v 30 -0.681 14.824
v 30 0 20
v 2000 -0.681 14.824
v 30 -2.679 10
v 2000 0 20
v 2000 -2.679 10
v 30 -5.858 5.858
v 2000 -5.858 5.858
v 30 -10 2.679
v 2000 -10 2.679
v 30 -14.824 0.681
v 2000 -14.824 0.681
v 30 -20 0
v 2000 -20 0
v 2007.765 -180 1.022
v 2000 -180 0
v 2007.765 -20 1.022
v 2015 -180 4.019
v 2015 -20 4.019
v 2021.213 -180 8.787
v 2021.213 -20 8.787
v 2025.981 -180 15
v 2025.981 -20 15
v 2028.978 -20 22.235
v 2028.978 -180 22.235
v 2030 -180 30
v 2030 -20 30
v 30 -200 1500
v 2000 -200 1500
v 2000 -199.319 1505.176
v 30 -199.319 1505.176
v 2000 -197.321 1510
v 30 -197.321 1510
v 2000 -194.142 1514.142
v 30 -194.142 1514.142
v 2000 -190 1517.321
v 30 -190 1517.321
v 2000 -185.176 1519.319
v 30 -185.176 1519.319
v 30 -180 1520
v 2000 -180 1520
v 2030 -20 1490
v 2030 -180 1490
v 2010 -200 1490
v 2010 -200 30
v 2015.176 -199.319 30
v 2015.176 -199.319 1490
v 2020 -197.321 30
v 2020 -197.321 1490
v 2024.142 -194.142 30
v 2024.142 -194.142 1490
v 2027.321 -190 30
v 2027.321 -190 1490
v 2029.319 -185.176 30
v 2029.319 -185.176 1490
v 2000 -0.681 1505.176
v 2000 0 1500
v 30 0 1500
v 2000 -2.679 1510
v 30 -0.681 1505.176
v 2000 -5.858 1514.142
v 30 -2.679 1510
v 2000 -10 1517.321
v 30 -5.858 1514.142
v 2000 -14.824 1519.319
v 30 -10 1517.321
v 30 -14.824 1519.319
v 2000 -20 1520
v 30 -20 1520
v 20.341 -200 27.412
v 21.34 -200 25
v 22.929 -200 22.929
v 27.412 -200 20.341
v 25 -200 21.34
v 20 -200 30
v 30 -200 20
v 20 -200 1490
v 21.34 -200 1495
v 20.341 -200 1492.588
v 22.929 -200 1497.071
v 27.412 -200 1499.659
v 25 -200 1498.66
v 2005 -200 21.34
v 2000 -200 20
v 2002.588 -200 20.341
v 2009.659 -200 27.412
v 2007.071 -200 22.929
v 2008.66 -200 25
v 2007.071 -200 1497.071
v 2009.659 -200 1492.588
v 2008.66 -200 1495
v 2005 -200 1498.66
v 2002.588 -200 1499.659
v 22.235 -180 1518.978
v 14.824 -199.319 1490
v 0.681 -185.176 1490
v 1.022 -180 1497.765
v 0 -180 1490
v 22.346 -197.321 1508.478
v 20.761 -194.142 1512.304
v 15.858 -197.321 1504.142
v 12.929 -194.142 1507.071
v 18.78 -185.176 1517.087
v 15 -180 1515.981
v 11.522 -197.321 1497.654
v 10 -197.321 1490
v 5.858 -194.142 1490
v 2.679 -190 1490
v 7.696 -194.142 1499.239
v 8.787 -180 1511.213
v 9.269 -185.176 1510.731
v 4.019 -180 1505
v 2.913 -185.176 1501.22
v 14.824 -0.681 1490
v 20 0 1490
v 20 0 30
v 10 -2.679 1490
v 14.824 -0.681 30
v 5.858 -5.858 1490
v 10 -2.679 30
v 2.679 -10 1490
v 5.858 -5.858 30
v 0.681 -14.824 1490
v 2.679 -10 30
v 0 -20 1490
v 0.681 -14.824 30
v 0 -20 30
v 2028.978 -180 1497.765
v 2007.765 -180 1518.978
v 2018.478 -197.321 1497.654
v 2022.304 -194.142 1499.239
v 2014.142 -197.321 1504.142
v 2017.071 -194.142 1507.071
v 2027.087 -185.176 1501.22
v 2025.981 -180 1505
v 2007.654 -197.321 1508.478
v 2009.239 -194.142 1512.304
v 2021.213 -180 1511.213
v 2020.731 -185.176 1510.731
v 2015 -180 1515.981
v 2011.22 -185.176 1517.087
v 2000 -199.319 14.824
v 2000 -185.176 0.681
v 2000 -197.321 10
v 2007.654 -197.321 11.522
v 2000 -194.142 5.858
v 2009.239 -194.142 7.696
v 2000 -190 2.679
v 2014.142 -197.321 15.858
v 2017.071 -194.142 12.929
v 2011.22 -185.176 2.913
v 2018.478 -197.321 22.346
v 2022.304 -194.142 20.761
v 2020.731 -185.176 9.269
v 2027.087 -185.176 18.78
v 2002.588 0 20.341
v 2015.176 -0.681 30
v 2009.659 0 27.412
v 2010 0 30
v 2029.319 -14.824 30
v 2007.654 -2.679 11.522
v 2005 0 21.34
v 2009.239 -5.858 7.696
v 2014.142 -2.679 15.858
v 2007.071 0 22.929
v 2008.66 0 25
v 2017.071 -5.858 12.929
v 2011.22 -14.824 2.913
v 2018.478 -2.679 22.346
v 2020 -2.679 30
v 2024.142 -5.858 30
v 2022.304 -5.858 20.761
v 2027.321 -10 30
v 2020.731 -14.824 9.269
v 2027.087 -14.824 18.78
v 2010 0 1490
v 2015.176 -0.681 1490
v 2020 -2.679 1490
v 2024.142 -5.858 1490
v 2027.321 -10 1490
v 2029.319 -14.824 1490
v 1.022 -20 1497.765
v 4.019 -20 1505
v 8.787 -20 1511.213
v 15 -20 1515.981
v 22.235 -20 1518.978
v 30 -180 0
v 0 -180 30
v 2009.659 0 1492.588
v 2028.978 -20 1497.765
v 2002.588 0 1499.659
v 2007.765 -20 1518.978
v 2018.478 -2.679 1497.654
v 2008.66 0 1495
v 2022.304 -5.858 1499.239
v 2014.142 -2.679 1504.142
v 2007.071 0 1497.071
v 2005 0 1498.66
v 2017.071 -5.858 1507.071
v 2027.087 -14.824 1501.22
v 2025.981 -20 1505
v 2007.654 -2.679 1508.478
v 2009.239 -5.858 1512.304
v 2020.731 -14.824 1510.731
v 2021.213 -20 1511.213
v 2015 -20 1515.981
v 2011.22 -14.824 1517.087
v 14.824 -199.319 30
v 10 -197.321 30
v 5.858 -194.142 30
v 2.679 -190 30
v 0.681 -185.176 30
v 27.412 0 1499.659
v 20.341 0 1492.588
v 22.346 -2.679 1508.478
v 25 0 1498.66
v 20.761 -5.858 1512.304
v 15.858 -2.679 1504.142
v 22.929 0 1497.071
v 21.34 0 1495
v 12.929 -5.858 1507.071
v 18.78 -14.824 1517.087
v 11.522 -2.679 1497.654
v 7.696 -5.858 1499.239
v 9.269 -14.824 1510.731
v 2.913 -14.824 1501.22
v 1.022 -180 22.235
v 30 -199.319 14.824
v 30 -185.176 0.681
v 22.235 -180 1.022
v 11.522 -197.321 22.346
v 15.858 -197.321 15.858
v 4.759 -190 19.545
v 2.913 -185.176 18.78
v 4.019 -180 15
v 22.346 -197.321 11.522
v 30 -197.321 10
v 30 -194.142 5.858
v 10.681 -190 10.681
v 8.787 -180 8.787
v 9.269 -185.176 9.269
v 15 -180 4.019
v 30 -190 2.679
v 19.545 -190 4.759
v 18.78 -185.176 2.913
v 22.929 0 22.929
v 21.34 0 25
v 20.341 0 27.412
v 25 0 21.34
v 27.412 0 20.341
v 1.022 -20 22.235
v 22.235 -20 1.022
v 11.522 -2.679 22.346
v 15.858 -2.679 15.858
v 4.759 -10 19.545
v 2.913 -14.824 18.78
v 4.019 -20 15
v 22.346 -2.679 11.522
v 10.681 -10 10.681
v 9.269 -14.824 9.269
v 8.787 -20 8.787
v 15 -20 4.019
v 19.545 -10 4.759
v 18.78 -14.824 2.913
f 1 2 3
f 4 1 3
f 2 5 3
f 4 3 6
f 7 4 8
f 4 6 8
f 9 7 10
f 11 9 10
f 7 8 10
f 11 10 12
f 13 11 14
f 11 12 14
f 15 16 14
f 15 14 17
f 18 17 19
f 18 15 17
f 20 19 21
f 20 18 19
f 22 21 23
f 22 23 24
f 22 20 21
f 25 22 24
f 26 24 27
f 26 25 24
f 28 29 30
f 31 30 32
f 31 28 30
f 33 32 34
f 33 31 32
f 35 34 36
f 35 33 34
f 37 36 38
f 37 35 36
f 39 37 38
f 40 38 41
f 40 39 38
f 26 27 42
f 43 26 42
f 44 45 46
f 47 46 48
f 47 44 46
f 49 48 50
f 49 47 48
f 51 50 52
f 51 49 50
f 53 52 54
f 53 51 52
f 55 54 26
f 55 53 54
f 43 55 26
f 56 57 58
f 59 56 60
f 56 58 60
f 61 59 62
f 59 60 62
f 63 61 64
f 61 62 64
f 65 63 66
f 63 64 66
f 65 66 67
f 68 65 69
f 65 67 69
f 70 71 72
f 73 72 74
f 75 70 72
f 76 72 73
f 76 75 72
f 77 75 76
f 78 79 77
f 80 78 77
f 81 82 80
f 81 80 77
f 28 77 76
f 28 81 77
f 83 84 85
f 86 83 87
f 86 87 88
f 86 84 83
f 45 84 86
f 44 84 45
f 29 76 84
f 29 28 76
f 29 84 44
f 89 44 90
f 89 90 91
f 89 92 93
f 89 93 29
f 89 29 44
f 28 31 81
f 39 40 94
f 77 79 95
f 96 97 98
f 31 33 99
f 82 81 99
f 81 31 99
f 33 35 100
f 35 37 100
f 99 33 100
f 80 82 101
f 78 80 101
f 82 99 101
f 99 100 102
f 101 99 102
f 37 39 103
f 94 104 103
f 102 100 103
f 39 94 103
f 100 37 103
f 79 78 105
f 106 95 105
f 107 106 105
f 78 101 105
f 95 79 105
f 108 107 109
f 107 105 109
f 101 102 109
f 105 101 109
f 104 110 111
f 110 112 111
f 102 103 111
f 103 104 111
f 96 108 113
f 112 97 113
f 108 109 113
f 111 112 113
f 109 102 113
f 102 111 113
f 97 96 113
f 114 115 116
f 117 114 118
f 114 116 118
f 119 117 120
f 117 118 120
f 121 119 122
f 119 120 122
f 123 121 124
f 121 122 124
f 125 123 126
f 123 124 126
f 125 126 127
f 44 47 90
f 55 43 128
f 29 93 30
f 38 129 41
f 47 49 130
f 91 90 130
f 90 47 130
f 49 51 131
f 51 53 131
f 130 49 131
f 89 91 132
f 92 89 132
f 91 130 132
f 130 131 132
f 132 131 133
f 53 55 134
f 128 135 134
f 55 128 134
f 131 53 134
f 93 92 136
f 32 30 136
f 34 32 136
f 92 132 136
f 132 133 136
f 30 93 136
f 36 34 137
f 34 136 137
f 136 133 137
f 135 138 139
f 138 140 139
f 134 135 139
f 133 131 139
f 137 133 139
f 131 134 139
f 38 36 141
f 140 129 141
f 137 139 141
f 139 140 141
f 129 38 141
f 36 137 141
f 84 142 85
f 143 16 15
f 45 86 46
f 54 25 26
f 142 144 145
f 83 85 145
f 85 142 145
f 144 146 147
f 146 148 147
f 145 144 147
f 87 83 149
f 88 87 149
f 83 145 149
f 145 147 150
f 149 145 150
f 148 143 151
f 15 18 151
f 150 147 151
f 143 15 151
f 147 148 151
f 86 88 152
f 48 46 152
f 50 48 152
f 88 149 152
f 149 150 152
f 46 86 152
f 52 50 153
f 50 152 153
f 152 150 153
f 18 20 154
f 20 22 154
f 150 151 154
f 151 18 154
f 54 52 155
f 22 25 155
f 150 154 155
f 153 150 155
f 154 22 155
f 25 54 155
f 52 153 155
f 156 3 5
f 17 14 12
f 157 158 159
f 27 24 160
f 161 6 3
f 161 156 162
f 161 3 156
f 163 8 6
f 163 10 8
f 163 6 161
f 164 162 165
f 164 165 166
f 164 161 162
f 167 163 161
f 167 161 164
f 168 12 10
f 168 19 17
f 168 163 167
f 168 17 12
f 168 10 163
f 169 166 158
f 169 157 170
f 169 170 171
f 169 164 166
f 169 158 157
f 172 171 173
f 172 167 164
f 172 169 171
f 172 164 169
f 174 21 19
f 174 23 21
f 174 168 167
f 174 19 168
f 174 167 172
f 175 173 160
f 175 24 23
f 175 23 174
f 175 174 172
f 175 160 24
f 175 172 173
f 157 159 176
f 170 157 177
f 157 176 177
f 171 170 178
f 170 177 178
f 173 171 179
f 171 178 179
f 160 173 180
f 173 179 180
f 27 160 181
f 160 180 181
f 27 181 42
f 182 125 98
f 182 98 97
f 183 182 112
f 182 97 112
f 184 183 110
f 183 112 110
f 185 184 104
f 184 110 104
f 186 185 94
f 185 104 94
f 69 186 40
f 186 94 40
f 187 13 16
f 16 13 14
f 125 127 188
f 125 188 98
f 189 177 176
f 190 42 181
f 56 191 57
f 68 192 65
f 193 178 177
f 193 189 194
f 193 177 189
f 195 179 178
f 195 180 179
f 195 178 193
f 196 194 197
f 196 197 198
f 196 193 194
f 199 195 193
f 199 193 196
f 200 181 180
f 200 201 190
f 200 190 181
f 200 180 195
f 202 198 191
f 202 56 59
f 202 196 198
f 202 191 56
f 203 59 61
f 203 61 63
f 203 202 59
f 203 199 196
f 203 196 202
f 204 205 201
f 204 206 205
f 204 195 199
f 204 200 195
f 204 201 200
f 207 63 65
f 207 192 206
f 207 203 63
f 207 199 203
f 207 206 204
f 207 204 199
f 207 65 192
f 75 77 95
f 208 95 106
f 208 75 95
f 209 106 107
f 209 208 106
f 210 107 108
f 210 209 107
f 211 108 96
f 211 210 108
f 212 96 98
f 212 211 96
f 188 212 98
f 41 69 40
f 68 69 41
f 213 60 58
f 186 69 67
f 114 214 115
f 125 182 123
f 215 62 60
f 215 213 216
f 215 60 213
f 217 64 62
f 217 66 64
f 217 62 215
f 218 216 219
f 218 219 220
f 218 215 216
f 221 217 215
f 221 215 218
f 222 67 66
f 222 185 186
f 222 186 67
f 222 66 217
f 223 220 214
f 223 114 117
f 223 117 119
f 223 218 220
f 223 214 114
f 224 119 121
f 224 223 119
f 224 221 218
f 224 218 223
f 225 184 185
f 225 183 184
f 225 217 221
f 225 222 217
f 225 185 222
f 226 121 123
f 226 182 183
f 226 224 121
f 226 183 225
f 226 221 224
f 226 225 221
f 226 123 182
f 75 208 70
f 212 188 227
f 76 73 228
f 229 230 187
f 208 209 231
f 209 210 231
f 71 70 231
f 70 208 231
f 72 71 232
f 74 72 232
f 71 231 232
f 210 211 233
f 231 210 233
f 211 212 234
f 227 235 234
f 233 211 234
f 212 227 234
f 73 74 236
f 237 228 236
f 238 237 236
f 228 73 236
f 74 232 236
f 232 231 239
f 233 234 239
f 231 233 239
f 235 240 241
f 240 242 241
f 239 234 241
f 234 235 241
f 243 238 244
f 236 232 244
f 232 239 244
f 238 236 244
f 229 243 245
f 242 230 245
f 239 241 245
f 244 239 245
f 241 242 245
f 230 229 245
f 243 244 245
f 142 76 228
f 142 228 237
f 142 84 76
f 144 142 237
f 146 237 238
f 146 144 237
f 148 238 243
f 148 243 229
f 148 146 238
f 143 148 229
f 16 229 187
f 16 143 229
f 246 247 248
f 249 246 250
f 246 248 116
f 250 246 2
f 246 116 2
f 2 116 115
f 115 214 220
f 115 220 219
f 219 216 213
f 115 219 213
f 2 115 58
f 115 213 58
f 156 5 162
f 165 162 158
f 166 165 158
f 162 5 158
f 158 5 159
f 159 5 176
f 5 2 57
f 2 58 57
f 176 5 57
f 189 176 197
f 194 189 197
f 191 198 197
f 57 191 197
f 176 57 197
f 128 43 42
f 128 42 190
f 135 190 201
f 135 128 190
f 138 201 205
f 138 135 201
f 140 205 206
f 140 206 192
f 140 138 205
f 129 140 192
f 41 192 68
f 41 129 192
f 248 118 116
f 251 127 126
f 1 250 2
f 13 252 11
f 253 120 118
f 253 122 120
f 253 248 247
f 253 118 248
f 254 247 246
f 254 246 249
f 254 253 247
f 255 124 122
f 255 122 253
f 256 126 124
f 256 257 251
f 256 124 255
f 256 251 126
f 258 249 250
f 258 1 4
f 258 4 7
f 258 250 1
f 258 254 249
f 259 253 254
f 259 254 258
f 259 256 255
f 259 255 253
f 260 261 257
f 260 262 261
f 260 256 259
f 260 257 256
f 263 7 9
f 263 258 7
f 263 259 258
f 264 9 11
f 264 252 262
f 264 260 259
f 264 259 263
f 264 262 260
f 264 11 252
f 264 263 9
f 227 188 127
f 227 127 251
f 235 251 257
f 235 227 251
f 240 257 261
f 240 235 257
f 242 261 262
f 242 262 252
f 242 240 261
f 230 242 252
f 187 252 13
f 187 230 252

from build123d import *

# Parameters (mm, degrees)
F0_W     = 2030
F0_H     = 1520
F1_DEPTH = 200
F2_R     = 30
F3_R     = 20


with BuildPart() as f1:
    # F0 (on Front) → F1 (new body)
    with BuildSketch(Plane.XZ):
        with Locations((1015, 760)):
            Rectangle(F0_W, F0_H)
    extrude(amount=F1_DEPTH)

    # F2
    f2_edges = [f1.edges().sort_by_distance(p)[0] for p in [
        (2030, -100, 0),
        (0, -100, 0),
        (2030, -100, 1520),
        (0, -100, 1520),
    ]]
    fillet(f2_edges, radius=F2_R)

    # F3
    f3_edges = [f1.edges().sort_by_distance(p)[0] for p in [
        (1015, -200, 0),
        (1015, 0, 0),
    ]]
    fillet(f3_edges, radius=F3_R)


solid = f1.part
